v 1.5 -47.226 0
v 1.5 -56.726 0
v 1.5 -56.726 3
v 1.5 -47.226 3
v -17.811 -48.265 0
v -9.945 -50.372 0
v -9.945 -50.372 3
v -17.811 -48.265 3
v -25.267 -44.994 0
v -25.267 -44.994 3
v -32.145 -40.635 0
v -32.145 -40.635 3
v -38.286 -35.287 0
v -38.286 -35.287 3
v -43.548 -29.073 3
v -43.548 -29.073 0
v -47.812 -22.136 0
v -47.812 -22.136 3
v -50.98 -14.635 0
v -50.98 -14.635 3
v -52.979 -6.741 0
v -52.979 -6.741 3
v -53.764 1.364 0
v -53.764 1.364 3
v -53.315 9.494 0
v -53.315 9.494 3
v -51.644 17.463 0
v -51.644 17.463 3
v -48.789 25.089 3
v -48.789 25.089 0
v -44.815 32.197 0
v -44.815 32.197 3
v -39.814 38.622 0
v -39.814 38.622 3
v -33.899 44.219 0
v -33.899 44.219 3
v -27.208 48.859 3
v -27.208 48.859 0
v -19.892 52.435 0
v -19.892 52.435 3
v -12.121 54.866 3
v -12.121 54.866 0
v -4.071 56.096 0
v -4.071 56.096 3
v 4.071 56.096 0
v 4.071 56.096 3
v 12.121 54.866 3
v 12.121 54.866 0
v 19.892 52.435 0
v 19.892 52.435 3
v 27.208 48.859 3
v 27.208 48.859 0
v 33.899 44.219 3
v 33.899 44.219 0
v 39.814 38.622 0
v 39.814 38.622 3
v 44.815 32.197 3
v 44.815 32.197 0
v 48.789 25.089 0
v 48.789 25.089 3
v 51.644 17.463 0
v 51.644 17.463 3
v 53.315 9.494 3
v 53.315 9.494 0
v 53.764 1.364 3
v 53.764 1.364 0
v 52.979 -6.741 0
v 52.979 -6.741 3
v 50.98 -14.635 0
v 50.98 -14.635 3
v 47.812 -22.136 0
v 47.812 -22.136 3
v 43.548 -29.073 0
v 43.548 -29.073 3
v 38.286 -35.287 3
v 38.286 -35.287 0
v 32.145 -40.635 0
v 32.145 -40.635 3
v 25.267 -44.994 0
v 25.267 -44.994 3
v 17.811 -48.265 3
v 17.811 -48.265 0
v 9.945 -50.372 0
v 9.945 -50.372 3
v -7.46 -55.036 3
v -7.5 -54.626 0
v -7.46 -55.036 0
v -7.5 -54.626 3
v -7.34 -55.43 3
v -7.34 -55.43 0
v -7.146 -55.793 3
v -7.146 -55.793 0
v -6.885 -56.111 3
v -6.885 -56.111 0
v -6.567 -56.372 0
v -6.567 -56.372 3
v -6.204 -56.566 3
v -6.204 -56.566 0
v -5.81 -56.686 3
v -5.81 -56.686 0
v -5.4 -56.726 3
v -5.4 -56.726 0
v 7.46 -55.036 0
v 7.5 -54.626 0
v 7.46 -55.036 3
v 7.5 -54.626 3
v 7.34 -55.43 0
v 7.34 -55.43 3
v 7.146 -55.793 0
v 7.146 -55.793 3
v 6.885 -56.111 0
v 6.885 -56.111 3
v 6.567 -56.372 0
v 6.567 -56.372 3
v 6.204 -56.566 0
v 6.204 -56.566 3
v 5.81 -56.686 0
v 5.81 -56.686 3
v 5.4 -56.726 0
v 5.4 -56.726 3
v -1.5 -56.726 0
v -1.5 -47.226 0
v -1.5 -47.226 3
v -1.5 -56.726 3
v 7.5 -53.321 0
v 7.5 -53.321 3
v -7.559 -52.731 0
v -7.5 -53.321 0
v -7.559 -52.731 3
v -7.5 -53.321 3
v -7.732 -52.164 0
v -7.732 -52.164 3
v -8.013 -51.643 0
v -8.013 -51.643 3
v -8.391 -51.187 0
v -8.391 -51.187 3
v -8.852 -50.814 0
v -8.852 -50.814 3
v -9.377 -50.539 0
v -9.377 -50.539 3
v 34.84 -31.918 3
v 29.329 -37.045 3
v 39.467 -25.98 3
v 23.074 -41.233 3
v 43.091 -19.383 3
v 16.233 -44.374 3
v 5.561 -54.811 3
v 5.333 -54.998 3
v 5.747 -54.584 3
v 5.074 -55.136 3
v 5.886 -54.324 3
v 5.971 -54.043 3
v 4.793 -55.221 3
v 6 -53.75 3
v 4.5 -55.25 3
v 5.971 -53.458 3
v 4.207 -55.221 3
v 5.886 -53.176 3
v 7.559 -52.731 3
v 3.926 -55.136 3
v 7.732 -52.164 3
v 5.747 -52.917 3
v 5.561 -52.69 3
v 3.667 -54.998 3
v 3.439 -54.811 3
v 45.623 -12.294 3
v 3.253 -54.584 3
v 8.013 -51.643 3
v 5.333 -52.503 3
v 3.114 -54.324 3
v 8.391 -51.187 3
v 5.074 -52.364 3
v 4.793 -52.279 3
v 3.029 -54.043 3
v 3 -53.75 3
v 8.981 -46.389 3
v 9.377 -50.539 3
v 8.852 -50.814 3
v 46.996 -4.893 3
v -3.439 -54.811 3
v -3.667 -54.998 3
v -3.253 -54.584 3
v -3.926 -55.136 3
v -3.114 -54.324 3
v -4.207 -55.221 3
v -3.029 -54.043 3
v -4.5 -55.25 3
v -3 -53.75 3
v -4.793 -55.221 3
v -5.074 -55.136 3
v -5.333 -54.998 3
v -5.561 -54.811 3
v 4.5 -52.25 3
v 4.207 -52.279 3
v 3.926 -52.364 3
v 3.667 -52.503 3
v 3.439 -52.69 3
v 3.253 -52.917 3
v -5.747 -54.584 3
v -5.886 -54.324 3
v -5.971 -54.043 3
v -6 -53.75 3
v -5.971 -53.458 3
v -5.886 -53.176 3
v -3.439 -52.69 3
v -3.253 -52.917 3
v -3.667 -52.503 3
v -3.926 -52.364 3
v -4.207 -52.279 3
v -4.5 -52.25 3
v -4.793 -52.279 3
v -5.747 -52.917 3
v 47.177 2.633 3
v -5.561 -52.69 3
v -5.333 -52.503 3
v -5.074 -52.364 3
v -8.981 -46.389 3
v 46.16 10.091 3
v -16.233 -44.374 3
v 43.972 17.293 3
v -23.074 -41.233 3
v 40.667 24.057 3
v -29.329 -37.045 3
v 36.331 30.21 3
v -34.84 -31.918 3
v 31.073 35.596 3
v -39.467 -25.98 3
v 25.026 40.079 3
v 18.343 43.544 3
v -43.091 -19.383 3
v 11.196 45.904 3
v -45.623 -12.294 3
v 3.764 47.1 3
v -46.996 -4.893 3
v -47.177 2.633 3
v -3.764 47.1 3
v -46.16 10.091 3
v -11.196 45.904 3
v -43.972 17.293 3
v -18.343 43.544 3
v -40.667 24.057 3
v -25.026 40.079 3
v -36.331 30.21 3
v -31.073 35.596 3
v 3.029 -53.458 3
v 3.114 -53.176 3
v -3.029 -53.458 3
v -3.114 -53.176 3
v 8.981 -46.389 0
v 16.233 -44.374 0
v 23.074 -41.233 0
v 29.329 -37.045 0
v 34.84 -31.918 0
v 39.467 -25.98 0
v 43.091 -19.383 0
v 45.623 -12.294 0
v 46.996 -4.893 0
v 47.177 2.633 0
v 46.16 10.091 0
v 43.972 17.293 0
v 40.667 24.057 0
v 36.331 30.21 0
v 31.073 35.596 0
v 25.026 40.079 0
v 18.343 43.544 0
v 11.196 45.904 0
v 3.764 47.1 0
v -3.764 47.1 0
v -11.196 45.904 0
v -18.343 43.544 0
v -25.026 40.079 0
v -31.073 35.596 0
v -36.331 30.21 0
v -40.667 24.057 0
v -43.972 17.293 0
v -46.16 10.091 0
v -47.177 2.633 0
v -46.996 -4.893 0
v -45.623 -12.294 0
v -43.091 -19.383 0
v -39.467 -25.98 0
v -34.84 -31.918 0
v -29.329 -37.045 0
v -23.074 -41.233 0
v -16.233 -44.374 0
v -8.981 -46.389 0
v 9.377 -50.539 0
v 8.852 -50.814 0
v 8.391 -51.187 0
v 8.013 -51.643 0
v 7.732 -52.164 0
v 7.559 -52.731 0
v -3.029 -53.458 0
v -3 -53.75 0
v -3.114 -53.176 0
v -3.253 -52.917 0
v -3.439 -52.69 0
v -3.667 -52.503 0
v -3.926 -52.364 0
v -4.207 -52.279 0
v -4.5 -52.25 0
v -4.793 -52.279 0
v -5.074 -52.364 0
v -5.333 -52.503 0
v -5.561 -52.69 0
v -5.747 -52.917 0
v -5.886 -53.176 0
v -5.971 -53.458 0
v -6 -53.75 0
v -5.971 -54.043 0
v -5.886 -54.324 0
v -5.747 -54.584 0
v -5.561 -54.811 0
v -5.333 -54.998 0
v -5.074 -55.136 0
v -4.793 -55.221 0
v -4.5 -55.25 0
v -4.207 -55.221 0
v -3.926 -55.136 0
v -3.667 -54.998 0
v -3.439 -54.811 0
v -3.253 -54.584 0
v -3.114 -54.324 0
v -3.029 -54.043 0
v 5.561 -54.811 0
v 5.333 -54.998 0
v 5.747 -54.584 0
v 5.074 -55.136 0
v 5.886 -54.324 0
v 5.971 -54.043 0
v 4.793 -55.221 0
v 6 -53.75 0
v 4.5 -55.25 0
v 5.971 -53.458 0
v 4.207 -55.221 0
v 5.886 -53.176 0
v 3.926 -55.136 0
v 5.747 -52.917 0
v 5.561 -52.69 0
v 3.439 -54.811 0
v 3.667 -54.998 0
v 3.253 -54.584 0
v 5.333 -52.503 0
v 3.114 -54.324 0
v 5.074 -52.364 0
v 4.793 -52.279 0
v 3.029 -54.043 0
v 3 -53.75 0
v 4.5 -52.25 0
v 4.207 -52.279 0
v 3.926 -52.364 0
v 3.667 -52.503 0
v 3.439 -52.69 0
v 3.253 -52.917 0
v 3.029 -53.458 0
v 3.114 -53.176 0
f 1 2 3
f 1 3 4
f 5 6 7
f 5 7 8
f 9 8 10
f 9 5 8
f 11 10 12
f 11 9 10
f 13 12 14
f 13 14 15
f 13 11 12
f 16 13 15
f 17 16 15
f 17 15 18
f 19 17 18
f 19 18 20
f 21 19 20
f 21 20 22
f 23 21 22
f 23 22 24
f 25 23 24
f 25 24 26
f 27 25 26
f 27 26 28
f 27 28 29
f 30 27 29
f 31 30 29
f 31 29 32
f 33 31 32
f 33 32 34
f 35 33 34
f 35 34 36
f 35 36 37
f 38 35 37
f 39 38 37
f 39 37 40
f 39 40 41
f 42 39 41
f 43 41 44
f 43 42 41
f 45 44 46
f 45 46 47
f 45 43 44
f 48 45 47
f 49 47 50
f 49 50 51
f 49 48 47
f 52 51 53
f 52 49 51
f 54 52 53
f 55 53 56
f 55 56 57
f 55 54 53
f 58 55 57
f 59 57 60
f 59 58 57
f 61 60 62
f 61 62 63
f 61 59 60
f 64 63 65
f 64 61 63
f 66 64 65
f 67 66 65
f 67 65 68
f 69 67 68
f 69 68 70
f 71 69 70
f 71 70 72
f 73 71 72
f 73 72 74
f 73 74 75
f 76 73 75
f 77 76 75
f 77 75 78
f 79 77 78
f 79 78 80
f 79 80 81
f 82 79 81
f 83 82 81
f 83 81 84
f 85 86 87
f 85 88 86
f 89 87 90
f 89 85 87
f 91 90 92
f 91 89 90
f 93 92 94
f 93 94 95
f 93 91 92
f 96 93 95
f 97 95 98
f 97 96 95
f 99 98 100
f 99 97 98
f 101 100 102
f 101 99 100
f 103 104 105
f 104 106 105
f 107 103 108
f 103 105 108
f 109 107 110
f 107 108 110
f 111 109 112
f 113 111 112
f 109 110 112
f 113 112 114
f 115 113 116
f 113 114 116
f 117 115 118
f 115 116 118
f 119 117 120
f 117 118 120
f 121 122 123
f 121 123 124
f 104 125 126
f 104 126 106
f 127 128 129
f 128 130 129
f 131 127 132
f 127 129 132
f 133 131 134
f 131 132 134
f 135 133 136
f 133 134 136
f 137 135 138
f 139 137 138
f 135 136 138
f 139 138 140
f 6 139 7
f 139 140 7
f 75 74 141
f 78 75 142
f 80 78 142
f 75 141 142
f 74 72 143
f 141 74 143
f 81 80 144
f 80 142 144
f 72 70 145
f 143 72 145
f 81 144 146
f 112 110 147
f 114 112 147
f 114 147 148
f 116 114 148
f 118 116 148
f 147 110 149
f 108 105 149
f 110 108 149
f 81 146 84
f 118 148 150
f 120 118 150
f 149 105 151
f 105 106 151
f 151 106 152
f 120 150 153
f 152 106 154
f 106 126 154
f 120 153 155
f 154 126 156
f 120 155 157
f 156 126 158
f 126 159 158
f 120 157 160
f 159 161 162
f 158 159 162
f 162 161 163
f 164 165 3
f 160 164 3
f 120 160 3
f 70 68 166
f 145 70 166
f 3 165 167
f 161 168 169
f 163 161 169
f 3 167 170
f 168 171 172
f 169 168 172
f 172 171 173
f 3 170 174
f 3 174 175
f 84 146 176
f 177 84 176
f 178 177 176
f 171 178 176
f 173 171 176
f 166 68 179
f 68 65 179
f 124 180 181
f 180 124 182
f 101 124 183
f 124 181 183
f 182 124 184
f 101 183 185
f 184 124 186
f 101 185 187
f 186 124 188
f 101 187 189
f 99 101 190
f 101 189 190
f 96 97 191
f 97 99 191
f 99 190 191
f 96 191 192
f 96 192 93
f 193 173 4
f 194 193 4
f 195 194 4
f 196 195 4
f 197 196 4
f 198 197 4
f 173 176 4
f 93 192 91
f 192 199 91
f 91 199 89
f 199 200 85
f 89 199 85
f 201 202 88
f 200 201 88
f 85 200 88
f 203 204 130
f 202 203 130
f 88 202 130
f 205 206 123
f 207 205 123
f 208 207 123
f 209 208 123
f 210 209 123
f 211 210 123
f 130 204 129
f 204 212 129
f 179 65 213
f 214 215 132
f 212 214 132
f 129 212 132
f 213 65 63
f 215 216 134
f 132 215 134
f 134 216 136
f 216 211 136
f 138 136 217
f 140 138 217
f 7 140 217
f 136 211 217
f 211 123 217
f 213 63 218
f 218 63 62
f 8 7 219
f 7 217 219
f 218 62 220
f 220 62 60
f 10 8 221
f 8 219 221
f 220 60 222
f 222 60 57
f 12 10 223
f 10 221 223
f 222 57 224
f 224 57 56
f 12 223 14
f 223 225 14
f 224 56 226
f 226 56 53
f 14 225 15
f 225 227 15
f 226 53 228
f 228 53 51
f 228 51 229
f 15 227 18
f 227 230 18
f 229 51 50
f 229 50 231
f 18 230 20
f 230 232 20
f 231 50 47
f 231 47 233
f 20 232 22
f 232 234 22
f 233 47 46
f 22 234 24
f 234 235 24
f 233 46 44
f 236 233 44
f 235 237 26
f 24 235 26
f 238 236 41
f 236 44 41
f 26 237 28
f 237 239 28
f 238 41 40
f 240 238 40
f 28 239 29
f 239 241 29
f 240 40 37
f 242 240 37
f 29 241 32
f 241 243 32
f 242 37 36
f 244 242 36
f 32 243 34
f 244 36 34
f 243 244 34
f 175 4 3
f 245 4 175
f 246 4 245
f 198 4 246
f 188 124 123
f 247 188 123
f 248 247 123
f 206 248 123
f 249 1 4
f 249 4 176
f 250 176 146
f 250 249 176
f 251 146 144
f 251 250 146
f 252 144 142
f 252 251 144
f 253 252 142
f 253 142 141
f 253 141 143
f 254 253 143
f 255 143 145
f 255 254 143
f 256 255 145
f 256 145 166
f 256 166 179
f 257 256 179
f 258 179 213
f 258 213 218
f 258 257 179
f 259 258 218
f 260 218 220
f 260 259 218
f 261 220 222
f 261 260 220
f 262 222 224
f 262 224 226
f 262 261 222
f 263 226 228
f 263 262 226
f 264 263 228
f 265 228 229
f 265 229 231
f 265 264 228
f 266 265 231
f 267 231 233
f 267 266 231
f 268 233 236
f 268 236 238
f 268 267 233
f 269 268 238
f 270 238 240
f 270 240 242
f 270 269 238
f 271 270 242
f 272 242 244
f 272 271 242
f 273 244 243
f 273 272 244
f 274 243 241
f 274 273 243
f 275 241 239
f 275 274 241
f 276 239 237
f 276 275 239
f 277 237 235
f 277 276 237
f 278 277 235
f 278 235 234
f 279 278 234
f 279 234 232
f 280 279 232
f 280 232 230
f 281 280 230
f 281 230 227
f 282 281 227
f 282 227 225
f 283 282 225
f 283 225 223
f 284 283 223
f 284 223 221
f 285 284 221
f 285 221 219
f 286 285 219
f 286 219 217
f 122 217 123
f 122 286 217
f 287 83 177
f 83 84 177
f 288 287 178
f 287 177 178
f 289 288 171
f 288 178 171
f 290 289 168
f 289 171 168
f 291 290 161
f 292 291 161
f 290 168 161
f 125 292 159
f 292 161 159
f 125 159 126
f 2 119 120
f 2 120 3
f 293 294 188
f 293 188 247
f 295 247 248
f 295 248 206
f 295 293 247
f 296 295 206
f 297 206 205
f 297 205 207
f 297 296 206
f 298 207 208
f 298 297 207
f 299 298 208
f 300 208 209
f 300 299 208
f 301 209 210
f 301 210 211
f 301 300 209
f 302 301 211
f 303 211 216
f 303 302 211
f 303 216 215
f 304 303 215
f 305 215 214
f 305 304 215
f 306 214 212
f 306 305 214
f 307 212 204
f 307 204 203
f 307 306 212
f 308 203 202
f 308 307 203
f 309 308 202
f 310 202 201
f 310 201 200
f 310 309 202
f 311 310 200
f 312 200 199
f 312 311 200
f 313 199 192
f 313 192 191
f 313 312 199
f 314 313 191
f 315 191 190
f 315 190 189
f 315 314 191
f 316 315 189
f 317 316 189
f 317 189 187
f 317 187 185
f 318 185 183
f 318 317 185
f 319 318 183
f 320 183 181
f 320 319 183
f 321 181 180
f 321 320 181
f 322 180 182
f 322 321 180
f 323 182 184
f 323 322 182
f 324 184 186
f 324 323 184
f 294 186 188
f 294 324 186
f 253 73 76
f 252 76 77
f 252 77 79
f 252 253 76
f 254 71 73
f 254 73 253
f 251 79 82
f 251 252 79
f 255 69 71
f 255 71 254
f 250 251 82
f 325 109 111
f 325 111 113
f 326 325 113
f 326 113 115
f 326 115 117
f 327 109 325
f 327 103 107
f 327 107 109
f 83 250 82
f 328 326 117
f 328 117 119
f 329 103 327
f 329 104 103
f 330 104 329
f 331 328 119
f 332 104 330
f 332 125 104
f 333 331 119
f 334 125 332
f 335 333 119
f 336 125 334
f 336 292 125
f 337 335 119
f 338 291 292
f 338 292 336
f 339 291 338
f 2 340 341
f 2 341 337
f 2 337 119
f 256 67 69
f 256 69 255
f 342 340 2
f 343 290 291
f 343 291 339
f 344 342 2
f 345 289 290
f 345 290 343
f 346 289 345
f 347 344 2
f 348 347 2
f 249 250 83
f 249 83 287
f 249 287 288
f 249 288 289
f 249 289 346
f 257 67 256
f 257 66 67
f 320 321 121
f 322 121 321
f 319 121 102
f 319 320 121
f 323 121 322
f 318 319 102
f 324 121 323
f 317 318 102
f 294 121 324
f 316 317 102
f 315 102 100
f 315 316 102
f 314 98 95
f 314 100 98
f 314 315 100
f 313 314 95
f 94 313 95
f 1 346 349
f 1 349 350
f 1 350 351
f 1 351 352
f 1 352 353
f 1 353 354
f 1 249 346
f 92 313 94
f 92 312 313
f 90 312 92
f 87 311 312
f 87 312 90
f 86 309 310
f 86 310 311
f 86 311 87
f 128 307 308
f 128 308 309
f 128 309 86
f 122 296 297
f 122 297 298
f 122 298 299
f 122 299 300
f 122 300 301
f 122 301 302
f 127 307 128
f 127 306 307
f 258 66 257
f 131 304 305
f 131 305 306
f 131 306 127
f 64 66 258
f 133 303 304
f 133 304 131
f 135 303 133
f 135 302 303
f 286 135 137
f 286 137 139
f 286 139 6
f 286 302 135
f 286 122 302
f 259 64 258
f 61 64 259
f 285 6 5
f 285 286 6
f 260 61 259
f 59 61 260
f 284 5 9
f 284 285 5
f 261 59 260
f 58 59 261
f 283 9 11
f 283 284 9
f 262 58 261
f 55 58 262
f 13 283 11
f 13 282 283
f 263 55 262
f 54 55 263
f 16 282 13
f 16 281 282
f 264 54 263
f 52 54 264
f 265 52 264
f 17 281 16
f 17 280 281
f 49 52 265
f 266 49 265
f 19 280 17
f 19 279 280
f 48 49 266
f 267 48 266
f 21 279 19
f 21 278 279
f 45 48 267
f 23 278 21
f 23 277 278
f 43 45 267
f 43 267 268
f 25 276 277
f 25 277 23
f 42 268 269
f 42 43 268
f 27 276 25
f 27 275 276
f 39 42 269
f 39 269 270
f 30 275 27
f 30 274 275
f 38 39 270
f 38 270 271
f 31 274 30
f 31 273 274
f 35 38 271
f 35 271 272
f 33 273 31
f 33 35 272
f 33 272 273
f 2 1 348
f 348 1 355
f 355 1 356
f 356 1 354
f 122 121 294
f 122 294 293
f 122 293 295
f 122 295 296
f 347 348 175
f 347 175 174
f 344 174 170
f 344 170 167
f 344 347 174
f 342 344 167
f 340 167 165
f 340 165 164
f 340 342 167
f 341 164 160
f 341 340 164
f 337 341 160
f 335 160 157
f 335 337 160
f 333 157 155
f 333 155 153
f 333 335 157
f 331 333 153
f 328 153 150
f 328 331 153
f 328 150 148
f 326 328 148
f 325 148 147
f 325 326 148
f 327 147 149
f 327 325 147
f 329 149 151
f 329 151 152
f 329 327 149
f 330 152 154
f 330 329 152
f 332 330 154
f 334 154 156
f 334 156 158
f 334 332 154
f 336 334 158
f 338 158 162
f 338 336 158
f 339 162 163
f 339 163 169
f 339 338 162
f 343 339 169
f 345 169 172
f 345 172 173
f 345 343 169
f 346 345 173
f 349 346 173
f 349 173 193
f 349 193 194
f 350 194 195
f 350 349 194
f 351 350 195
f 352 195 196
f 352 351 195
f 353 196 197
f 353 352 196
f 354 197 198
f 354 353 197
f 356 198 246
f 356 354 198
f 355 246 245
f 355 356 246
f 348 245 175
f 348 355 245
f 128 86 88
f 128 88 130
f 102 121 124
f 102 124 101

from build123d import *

# Parameters (mm, degrees)
BODYSKE_R      = 1.5
BASEBODY_DEPTH = 3
FILLET1_R      = 3
FILLET2_R      = 2.1


with BuildPart() as part:
    # BodySke → BaseBody (new body)
    with BuildSketch(Plane.XY):
        with BuildLine():
            Line((-1.5, -47.226184474), (-1.5, -56.726184474))
            Line((-1.5, -56.726184474), (-7.5, -56.726184474))
            Line((-7.5, -56.726184474), (-7.5, -50.774419011))
            ThreePointArc((-7.5, -50.774419011), (0, 56.25), (7.5, -50.774419011))
            Line((7.5, -50.774419011), (7.5, -56.726184474))
            Line((7.5, -56.726184474), (1.5, -56.726184474))
            Line((1.5, -56.726184474), (1.5, -47.226184474))
            ThreePointArc((1.5, -47.226184474), (0, 47.25), (-1.5, -47.226184474))
        make_face()
        with Locations((-4.5, -53.750301743)):
            Circle(BODYSKE_R, mode=Mode.SUBTRACT)
        with Locations(Location((4.5, -53.750301743, 0), (0, 0, 180))):
            Circle(BODYSKE_R, mode=Mode.SUBTRACT)
    extrude(amount=BASEBODY_DEPTH)

    # Fillet1
    fillet1_edges = [part.edges().sort_by_distance(p)[0] for p in [
        (-7.5, -50.774419011, 1.5),
        (7.5, -50.774419011, 1.5),
    ]]
    fillet(fillet1_edges, radius=FILLET1_R)

    # Fillet2
    fillet2_edges = [part.edges().sort_by_distance(p)[0] for p in [
        (-7.5, -56.726184474, 1.5),
        (7.5, -56.726184474, 1.5),
    ]]
    fillet(fillet2_edges, radius=FILLET2_R)


solid = part.part
